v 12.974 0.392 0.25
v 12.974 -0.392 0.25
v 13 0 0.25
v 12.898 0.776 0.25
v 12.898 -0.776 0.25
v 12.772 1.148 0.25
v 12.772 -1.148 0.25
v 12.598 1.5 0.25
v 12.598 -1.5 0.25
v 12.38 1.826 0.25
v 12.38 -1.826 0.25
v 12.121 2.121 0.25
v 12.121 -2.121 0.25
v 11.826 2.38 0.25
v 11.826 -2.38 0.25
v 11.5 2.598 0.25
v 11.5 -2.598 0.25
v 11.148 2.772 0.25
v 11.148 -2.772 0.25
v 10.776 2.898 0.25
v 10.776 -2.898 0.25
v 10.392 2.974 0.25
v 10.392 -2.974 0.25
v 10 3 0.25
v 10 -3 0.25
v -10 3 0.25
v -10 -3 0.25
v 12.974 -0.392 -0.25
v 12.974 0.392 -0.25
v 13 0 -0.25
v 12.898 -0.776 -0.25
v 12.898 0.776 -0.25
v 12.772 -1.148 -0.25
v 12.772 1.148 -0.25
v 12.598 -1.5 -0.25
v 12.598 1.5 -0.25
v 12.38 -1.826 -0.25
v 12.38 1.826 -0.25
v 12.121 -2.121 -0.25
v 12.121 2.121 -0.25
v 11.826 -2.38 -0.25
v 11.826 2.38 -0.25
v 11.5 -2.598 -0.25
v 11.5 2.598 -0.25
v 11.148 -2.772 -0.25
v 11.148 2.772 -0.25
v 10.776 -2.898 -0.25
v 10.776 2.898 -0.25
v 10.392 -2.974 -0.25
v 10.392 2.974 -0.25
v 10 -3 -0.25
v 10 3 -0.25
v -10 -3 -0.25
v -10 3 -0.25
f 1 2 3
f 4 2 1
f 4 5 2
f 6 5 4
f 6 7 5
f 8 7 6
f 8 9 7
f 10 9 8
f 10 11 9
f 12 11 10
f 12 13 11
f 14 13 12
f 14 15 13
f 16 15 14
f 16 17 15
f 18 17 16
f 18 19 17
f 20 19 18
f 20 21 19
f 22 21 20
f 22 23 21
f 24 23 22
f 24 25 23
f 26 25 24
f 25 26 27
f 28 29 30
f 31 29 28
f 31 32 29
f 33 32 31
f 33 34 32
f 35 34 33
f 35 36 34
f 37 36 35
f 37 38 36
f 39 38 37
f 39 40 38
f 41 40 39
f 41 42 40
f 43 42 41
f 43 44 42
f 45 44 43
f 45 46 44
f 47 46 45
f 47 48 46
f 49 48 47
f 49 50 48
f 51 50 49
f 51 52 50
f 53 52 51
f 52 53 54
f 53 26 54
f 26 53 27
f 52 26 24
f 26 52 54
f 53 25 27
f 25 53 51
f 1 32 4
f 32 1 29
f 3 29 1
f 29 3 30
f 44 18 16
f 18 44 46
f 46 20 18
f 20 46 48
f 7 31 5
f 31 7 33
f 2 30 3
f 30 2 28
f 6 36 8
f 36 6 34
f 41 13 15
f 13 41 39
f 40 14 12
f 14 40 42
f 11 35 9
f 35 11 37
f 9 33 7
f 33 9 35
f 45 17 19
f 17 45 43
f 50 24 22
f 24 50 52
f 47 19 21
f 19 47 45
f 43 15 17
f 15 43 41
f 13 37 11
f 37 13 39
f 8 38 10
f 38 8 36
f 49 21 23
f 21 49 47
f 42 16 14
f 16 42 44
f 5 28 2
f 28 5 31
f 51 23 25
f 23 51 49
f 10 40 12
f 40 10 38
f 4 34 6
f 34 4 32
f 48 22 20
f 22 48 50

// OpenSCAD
$fa = 1;
$fs = 0.4;


module laptop(lid_rotation, color = "#4b4d51"){
    laptop_width = 32;
    laptop_depth = 20.5;
    color(color){        
        cube([laptop_depth, laptop_width, 1], center=true);
        
        translate([-laptop_depth/2,0,0])
        rotate([0,lid_rotation,0])
        translate([-laptop_depth/2,0,0])
        cube([laptop_depth, laptop_width, 1], center=true);
    }
}

module dock_port(color = "#b804e0"){
    port_width = 9;
    port_depth = 4.5;
    port_height = 1.02;
    
    color(color){
        cube([port_depth, port_width, port_height], center=true);
        translate([0,-4.5, 0])
        rotate([90,0,0])
        cylinder(h=1, r=0.5);
    }
}

module stand_seating(color = "#04bbe0"){
    
    color(color){
    
    }
}

module stand_leg(color = "#84e004"){
    leg_width = 6;
    leg_thickness = 0.5;
    leg_length = 20;
    color(color){
        cube([leg_length,leg_width,leg_thickness], center=true);
        translate([leg_length/2, 0, 0])
        cylinder(h=leg_thickness, r=leg_width/2, center=true);
    }
}


//laptop(45);
//dock_port();


stand_leg();
